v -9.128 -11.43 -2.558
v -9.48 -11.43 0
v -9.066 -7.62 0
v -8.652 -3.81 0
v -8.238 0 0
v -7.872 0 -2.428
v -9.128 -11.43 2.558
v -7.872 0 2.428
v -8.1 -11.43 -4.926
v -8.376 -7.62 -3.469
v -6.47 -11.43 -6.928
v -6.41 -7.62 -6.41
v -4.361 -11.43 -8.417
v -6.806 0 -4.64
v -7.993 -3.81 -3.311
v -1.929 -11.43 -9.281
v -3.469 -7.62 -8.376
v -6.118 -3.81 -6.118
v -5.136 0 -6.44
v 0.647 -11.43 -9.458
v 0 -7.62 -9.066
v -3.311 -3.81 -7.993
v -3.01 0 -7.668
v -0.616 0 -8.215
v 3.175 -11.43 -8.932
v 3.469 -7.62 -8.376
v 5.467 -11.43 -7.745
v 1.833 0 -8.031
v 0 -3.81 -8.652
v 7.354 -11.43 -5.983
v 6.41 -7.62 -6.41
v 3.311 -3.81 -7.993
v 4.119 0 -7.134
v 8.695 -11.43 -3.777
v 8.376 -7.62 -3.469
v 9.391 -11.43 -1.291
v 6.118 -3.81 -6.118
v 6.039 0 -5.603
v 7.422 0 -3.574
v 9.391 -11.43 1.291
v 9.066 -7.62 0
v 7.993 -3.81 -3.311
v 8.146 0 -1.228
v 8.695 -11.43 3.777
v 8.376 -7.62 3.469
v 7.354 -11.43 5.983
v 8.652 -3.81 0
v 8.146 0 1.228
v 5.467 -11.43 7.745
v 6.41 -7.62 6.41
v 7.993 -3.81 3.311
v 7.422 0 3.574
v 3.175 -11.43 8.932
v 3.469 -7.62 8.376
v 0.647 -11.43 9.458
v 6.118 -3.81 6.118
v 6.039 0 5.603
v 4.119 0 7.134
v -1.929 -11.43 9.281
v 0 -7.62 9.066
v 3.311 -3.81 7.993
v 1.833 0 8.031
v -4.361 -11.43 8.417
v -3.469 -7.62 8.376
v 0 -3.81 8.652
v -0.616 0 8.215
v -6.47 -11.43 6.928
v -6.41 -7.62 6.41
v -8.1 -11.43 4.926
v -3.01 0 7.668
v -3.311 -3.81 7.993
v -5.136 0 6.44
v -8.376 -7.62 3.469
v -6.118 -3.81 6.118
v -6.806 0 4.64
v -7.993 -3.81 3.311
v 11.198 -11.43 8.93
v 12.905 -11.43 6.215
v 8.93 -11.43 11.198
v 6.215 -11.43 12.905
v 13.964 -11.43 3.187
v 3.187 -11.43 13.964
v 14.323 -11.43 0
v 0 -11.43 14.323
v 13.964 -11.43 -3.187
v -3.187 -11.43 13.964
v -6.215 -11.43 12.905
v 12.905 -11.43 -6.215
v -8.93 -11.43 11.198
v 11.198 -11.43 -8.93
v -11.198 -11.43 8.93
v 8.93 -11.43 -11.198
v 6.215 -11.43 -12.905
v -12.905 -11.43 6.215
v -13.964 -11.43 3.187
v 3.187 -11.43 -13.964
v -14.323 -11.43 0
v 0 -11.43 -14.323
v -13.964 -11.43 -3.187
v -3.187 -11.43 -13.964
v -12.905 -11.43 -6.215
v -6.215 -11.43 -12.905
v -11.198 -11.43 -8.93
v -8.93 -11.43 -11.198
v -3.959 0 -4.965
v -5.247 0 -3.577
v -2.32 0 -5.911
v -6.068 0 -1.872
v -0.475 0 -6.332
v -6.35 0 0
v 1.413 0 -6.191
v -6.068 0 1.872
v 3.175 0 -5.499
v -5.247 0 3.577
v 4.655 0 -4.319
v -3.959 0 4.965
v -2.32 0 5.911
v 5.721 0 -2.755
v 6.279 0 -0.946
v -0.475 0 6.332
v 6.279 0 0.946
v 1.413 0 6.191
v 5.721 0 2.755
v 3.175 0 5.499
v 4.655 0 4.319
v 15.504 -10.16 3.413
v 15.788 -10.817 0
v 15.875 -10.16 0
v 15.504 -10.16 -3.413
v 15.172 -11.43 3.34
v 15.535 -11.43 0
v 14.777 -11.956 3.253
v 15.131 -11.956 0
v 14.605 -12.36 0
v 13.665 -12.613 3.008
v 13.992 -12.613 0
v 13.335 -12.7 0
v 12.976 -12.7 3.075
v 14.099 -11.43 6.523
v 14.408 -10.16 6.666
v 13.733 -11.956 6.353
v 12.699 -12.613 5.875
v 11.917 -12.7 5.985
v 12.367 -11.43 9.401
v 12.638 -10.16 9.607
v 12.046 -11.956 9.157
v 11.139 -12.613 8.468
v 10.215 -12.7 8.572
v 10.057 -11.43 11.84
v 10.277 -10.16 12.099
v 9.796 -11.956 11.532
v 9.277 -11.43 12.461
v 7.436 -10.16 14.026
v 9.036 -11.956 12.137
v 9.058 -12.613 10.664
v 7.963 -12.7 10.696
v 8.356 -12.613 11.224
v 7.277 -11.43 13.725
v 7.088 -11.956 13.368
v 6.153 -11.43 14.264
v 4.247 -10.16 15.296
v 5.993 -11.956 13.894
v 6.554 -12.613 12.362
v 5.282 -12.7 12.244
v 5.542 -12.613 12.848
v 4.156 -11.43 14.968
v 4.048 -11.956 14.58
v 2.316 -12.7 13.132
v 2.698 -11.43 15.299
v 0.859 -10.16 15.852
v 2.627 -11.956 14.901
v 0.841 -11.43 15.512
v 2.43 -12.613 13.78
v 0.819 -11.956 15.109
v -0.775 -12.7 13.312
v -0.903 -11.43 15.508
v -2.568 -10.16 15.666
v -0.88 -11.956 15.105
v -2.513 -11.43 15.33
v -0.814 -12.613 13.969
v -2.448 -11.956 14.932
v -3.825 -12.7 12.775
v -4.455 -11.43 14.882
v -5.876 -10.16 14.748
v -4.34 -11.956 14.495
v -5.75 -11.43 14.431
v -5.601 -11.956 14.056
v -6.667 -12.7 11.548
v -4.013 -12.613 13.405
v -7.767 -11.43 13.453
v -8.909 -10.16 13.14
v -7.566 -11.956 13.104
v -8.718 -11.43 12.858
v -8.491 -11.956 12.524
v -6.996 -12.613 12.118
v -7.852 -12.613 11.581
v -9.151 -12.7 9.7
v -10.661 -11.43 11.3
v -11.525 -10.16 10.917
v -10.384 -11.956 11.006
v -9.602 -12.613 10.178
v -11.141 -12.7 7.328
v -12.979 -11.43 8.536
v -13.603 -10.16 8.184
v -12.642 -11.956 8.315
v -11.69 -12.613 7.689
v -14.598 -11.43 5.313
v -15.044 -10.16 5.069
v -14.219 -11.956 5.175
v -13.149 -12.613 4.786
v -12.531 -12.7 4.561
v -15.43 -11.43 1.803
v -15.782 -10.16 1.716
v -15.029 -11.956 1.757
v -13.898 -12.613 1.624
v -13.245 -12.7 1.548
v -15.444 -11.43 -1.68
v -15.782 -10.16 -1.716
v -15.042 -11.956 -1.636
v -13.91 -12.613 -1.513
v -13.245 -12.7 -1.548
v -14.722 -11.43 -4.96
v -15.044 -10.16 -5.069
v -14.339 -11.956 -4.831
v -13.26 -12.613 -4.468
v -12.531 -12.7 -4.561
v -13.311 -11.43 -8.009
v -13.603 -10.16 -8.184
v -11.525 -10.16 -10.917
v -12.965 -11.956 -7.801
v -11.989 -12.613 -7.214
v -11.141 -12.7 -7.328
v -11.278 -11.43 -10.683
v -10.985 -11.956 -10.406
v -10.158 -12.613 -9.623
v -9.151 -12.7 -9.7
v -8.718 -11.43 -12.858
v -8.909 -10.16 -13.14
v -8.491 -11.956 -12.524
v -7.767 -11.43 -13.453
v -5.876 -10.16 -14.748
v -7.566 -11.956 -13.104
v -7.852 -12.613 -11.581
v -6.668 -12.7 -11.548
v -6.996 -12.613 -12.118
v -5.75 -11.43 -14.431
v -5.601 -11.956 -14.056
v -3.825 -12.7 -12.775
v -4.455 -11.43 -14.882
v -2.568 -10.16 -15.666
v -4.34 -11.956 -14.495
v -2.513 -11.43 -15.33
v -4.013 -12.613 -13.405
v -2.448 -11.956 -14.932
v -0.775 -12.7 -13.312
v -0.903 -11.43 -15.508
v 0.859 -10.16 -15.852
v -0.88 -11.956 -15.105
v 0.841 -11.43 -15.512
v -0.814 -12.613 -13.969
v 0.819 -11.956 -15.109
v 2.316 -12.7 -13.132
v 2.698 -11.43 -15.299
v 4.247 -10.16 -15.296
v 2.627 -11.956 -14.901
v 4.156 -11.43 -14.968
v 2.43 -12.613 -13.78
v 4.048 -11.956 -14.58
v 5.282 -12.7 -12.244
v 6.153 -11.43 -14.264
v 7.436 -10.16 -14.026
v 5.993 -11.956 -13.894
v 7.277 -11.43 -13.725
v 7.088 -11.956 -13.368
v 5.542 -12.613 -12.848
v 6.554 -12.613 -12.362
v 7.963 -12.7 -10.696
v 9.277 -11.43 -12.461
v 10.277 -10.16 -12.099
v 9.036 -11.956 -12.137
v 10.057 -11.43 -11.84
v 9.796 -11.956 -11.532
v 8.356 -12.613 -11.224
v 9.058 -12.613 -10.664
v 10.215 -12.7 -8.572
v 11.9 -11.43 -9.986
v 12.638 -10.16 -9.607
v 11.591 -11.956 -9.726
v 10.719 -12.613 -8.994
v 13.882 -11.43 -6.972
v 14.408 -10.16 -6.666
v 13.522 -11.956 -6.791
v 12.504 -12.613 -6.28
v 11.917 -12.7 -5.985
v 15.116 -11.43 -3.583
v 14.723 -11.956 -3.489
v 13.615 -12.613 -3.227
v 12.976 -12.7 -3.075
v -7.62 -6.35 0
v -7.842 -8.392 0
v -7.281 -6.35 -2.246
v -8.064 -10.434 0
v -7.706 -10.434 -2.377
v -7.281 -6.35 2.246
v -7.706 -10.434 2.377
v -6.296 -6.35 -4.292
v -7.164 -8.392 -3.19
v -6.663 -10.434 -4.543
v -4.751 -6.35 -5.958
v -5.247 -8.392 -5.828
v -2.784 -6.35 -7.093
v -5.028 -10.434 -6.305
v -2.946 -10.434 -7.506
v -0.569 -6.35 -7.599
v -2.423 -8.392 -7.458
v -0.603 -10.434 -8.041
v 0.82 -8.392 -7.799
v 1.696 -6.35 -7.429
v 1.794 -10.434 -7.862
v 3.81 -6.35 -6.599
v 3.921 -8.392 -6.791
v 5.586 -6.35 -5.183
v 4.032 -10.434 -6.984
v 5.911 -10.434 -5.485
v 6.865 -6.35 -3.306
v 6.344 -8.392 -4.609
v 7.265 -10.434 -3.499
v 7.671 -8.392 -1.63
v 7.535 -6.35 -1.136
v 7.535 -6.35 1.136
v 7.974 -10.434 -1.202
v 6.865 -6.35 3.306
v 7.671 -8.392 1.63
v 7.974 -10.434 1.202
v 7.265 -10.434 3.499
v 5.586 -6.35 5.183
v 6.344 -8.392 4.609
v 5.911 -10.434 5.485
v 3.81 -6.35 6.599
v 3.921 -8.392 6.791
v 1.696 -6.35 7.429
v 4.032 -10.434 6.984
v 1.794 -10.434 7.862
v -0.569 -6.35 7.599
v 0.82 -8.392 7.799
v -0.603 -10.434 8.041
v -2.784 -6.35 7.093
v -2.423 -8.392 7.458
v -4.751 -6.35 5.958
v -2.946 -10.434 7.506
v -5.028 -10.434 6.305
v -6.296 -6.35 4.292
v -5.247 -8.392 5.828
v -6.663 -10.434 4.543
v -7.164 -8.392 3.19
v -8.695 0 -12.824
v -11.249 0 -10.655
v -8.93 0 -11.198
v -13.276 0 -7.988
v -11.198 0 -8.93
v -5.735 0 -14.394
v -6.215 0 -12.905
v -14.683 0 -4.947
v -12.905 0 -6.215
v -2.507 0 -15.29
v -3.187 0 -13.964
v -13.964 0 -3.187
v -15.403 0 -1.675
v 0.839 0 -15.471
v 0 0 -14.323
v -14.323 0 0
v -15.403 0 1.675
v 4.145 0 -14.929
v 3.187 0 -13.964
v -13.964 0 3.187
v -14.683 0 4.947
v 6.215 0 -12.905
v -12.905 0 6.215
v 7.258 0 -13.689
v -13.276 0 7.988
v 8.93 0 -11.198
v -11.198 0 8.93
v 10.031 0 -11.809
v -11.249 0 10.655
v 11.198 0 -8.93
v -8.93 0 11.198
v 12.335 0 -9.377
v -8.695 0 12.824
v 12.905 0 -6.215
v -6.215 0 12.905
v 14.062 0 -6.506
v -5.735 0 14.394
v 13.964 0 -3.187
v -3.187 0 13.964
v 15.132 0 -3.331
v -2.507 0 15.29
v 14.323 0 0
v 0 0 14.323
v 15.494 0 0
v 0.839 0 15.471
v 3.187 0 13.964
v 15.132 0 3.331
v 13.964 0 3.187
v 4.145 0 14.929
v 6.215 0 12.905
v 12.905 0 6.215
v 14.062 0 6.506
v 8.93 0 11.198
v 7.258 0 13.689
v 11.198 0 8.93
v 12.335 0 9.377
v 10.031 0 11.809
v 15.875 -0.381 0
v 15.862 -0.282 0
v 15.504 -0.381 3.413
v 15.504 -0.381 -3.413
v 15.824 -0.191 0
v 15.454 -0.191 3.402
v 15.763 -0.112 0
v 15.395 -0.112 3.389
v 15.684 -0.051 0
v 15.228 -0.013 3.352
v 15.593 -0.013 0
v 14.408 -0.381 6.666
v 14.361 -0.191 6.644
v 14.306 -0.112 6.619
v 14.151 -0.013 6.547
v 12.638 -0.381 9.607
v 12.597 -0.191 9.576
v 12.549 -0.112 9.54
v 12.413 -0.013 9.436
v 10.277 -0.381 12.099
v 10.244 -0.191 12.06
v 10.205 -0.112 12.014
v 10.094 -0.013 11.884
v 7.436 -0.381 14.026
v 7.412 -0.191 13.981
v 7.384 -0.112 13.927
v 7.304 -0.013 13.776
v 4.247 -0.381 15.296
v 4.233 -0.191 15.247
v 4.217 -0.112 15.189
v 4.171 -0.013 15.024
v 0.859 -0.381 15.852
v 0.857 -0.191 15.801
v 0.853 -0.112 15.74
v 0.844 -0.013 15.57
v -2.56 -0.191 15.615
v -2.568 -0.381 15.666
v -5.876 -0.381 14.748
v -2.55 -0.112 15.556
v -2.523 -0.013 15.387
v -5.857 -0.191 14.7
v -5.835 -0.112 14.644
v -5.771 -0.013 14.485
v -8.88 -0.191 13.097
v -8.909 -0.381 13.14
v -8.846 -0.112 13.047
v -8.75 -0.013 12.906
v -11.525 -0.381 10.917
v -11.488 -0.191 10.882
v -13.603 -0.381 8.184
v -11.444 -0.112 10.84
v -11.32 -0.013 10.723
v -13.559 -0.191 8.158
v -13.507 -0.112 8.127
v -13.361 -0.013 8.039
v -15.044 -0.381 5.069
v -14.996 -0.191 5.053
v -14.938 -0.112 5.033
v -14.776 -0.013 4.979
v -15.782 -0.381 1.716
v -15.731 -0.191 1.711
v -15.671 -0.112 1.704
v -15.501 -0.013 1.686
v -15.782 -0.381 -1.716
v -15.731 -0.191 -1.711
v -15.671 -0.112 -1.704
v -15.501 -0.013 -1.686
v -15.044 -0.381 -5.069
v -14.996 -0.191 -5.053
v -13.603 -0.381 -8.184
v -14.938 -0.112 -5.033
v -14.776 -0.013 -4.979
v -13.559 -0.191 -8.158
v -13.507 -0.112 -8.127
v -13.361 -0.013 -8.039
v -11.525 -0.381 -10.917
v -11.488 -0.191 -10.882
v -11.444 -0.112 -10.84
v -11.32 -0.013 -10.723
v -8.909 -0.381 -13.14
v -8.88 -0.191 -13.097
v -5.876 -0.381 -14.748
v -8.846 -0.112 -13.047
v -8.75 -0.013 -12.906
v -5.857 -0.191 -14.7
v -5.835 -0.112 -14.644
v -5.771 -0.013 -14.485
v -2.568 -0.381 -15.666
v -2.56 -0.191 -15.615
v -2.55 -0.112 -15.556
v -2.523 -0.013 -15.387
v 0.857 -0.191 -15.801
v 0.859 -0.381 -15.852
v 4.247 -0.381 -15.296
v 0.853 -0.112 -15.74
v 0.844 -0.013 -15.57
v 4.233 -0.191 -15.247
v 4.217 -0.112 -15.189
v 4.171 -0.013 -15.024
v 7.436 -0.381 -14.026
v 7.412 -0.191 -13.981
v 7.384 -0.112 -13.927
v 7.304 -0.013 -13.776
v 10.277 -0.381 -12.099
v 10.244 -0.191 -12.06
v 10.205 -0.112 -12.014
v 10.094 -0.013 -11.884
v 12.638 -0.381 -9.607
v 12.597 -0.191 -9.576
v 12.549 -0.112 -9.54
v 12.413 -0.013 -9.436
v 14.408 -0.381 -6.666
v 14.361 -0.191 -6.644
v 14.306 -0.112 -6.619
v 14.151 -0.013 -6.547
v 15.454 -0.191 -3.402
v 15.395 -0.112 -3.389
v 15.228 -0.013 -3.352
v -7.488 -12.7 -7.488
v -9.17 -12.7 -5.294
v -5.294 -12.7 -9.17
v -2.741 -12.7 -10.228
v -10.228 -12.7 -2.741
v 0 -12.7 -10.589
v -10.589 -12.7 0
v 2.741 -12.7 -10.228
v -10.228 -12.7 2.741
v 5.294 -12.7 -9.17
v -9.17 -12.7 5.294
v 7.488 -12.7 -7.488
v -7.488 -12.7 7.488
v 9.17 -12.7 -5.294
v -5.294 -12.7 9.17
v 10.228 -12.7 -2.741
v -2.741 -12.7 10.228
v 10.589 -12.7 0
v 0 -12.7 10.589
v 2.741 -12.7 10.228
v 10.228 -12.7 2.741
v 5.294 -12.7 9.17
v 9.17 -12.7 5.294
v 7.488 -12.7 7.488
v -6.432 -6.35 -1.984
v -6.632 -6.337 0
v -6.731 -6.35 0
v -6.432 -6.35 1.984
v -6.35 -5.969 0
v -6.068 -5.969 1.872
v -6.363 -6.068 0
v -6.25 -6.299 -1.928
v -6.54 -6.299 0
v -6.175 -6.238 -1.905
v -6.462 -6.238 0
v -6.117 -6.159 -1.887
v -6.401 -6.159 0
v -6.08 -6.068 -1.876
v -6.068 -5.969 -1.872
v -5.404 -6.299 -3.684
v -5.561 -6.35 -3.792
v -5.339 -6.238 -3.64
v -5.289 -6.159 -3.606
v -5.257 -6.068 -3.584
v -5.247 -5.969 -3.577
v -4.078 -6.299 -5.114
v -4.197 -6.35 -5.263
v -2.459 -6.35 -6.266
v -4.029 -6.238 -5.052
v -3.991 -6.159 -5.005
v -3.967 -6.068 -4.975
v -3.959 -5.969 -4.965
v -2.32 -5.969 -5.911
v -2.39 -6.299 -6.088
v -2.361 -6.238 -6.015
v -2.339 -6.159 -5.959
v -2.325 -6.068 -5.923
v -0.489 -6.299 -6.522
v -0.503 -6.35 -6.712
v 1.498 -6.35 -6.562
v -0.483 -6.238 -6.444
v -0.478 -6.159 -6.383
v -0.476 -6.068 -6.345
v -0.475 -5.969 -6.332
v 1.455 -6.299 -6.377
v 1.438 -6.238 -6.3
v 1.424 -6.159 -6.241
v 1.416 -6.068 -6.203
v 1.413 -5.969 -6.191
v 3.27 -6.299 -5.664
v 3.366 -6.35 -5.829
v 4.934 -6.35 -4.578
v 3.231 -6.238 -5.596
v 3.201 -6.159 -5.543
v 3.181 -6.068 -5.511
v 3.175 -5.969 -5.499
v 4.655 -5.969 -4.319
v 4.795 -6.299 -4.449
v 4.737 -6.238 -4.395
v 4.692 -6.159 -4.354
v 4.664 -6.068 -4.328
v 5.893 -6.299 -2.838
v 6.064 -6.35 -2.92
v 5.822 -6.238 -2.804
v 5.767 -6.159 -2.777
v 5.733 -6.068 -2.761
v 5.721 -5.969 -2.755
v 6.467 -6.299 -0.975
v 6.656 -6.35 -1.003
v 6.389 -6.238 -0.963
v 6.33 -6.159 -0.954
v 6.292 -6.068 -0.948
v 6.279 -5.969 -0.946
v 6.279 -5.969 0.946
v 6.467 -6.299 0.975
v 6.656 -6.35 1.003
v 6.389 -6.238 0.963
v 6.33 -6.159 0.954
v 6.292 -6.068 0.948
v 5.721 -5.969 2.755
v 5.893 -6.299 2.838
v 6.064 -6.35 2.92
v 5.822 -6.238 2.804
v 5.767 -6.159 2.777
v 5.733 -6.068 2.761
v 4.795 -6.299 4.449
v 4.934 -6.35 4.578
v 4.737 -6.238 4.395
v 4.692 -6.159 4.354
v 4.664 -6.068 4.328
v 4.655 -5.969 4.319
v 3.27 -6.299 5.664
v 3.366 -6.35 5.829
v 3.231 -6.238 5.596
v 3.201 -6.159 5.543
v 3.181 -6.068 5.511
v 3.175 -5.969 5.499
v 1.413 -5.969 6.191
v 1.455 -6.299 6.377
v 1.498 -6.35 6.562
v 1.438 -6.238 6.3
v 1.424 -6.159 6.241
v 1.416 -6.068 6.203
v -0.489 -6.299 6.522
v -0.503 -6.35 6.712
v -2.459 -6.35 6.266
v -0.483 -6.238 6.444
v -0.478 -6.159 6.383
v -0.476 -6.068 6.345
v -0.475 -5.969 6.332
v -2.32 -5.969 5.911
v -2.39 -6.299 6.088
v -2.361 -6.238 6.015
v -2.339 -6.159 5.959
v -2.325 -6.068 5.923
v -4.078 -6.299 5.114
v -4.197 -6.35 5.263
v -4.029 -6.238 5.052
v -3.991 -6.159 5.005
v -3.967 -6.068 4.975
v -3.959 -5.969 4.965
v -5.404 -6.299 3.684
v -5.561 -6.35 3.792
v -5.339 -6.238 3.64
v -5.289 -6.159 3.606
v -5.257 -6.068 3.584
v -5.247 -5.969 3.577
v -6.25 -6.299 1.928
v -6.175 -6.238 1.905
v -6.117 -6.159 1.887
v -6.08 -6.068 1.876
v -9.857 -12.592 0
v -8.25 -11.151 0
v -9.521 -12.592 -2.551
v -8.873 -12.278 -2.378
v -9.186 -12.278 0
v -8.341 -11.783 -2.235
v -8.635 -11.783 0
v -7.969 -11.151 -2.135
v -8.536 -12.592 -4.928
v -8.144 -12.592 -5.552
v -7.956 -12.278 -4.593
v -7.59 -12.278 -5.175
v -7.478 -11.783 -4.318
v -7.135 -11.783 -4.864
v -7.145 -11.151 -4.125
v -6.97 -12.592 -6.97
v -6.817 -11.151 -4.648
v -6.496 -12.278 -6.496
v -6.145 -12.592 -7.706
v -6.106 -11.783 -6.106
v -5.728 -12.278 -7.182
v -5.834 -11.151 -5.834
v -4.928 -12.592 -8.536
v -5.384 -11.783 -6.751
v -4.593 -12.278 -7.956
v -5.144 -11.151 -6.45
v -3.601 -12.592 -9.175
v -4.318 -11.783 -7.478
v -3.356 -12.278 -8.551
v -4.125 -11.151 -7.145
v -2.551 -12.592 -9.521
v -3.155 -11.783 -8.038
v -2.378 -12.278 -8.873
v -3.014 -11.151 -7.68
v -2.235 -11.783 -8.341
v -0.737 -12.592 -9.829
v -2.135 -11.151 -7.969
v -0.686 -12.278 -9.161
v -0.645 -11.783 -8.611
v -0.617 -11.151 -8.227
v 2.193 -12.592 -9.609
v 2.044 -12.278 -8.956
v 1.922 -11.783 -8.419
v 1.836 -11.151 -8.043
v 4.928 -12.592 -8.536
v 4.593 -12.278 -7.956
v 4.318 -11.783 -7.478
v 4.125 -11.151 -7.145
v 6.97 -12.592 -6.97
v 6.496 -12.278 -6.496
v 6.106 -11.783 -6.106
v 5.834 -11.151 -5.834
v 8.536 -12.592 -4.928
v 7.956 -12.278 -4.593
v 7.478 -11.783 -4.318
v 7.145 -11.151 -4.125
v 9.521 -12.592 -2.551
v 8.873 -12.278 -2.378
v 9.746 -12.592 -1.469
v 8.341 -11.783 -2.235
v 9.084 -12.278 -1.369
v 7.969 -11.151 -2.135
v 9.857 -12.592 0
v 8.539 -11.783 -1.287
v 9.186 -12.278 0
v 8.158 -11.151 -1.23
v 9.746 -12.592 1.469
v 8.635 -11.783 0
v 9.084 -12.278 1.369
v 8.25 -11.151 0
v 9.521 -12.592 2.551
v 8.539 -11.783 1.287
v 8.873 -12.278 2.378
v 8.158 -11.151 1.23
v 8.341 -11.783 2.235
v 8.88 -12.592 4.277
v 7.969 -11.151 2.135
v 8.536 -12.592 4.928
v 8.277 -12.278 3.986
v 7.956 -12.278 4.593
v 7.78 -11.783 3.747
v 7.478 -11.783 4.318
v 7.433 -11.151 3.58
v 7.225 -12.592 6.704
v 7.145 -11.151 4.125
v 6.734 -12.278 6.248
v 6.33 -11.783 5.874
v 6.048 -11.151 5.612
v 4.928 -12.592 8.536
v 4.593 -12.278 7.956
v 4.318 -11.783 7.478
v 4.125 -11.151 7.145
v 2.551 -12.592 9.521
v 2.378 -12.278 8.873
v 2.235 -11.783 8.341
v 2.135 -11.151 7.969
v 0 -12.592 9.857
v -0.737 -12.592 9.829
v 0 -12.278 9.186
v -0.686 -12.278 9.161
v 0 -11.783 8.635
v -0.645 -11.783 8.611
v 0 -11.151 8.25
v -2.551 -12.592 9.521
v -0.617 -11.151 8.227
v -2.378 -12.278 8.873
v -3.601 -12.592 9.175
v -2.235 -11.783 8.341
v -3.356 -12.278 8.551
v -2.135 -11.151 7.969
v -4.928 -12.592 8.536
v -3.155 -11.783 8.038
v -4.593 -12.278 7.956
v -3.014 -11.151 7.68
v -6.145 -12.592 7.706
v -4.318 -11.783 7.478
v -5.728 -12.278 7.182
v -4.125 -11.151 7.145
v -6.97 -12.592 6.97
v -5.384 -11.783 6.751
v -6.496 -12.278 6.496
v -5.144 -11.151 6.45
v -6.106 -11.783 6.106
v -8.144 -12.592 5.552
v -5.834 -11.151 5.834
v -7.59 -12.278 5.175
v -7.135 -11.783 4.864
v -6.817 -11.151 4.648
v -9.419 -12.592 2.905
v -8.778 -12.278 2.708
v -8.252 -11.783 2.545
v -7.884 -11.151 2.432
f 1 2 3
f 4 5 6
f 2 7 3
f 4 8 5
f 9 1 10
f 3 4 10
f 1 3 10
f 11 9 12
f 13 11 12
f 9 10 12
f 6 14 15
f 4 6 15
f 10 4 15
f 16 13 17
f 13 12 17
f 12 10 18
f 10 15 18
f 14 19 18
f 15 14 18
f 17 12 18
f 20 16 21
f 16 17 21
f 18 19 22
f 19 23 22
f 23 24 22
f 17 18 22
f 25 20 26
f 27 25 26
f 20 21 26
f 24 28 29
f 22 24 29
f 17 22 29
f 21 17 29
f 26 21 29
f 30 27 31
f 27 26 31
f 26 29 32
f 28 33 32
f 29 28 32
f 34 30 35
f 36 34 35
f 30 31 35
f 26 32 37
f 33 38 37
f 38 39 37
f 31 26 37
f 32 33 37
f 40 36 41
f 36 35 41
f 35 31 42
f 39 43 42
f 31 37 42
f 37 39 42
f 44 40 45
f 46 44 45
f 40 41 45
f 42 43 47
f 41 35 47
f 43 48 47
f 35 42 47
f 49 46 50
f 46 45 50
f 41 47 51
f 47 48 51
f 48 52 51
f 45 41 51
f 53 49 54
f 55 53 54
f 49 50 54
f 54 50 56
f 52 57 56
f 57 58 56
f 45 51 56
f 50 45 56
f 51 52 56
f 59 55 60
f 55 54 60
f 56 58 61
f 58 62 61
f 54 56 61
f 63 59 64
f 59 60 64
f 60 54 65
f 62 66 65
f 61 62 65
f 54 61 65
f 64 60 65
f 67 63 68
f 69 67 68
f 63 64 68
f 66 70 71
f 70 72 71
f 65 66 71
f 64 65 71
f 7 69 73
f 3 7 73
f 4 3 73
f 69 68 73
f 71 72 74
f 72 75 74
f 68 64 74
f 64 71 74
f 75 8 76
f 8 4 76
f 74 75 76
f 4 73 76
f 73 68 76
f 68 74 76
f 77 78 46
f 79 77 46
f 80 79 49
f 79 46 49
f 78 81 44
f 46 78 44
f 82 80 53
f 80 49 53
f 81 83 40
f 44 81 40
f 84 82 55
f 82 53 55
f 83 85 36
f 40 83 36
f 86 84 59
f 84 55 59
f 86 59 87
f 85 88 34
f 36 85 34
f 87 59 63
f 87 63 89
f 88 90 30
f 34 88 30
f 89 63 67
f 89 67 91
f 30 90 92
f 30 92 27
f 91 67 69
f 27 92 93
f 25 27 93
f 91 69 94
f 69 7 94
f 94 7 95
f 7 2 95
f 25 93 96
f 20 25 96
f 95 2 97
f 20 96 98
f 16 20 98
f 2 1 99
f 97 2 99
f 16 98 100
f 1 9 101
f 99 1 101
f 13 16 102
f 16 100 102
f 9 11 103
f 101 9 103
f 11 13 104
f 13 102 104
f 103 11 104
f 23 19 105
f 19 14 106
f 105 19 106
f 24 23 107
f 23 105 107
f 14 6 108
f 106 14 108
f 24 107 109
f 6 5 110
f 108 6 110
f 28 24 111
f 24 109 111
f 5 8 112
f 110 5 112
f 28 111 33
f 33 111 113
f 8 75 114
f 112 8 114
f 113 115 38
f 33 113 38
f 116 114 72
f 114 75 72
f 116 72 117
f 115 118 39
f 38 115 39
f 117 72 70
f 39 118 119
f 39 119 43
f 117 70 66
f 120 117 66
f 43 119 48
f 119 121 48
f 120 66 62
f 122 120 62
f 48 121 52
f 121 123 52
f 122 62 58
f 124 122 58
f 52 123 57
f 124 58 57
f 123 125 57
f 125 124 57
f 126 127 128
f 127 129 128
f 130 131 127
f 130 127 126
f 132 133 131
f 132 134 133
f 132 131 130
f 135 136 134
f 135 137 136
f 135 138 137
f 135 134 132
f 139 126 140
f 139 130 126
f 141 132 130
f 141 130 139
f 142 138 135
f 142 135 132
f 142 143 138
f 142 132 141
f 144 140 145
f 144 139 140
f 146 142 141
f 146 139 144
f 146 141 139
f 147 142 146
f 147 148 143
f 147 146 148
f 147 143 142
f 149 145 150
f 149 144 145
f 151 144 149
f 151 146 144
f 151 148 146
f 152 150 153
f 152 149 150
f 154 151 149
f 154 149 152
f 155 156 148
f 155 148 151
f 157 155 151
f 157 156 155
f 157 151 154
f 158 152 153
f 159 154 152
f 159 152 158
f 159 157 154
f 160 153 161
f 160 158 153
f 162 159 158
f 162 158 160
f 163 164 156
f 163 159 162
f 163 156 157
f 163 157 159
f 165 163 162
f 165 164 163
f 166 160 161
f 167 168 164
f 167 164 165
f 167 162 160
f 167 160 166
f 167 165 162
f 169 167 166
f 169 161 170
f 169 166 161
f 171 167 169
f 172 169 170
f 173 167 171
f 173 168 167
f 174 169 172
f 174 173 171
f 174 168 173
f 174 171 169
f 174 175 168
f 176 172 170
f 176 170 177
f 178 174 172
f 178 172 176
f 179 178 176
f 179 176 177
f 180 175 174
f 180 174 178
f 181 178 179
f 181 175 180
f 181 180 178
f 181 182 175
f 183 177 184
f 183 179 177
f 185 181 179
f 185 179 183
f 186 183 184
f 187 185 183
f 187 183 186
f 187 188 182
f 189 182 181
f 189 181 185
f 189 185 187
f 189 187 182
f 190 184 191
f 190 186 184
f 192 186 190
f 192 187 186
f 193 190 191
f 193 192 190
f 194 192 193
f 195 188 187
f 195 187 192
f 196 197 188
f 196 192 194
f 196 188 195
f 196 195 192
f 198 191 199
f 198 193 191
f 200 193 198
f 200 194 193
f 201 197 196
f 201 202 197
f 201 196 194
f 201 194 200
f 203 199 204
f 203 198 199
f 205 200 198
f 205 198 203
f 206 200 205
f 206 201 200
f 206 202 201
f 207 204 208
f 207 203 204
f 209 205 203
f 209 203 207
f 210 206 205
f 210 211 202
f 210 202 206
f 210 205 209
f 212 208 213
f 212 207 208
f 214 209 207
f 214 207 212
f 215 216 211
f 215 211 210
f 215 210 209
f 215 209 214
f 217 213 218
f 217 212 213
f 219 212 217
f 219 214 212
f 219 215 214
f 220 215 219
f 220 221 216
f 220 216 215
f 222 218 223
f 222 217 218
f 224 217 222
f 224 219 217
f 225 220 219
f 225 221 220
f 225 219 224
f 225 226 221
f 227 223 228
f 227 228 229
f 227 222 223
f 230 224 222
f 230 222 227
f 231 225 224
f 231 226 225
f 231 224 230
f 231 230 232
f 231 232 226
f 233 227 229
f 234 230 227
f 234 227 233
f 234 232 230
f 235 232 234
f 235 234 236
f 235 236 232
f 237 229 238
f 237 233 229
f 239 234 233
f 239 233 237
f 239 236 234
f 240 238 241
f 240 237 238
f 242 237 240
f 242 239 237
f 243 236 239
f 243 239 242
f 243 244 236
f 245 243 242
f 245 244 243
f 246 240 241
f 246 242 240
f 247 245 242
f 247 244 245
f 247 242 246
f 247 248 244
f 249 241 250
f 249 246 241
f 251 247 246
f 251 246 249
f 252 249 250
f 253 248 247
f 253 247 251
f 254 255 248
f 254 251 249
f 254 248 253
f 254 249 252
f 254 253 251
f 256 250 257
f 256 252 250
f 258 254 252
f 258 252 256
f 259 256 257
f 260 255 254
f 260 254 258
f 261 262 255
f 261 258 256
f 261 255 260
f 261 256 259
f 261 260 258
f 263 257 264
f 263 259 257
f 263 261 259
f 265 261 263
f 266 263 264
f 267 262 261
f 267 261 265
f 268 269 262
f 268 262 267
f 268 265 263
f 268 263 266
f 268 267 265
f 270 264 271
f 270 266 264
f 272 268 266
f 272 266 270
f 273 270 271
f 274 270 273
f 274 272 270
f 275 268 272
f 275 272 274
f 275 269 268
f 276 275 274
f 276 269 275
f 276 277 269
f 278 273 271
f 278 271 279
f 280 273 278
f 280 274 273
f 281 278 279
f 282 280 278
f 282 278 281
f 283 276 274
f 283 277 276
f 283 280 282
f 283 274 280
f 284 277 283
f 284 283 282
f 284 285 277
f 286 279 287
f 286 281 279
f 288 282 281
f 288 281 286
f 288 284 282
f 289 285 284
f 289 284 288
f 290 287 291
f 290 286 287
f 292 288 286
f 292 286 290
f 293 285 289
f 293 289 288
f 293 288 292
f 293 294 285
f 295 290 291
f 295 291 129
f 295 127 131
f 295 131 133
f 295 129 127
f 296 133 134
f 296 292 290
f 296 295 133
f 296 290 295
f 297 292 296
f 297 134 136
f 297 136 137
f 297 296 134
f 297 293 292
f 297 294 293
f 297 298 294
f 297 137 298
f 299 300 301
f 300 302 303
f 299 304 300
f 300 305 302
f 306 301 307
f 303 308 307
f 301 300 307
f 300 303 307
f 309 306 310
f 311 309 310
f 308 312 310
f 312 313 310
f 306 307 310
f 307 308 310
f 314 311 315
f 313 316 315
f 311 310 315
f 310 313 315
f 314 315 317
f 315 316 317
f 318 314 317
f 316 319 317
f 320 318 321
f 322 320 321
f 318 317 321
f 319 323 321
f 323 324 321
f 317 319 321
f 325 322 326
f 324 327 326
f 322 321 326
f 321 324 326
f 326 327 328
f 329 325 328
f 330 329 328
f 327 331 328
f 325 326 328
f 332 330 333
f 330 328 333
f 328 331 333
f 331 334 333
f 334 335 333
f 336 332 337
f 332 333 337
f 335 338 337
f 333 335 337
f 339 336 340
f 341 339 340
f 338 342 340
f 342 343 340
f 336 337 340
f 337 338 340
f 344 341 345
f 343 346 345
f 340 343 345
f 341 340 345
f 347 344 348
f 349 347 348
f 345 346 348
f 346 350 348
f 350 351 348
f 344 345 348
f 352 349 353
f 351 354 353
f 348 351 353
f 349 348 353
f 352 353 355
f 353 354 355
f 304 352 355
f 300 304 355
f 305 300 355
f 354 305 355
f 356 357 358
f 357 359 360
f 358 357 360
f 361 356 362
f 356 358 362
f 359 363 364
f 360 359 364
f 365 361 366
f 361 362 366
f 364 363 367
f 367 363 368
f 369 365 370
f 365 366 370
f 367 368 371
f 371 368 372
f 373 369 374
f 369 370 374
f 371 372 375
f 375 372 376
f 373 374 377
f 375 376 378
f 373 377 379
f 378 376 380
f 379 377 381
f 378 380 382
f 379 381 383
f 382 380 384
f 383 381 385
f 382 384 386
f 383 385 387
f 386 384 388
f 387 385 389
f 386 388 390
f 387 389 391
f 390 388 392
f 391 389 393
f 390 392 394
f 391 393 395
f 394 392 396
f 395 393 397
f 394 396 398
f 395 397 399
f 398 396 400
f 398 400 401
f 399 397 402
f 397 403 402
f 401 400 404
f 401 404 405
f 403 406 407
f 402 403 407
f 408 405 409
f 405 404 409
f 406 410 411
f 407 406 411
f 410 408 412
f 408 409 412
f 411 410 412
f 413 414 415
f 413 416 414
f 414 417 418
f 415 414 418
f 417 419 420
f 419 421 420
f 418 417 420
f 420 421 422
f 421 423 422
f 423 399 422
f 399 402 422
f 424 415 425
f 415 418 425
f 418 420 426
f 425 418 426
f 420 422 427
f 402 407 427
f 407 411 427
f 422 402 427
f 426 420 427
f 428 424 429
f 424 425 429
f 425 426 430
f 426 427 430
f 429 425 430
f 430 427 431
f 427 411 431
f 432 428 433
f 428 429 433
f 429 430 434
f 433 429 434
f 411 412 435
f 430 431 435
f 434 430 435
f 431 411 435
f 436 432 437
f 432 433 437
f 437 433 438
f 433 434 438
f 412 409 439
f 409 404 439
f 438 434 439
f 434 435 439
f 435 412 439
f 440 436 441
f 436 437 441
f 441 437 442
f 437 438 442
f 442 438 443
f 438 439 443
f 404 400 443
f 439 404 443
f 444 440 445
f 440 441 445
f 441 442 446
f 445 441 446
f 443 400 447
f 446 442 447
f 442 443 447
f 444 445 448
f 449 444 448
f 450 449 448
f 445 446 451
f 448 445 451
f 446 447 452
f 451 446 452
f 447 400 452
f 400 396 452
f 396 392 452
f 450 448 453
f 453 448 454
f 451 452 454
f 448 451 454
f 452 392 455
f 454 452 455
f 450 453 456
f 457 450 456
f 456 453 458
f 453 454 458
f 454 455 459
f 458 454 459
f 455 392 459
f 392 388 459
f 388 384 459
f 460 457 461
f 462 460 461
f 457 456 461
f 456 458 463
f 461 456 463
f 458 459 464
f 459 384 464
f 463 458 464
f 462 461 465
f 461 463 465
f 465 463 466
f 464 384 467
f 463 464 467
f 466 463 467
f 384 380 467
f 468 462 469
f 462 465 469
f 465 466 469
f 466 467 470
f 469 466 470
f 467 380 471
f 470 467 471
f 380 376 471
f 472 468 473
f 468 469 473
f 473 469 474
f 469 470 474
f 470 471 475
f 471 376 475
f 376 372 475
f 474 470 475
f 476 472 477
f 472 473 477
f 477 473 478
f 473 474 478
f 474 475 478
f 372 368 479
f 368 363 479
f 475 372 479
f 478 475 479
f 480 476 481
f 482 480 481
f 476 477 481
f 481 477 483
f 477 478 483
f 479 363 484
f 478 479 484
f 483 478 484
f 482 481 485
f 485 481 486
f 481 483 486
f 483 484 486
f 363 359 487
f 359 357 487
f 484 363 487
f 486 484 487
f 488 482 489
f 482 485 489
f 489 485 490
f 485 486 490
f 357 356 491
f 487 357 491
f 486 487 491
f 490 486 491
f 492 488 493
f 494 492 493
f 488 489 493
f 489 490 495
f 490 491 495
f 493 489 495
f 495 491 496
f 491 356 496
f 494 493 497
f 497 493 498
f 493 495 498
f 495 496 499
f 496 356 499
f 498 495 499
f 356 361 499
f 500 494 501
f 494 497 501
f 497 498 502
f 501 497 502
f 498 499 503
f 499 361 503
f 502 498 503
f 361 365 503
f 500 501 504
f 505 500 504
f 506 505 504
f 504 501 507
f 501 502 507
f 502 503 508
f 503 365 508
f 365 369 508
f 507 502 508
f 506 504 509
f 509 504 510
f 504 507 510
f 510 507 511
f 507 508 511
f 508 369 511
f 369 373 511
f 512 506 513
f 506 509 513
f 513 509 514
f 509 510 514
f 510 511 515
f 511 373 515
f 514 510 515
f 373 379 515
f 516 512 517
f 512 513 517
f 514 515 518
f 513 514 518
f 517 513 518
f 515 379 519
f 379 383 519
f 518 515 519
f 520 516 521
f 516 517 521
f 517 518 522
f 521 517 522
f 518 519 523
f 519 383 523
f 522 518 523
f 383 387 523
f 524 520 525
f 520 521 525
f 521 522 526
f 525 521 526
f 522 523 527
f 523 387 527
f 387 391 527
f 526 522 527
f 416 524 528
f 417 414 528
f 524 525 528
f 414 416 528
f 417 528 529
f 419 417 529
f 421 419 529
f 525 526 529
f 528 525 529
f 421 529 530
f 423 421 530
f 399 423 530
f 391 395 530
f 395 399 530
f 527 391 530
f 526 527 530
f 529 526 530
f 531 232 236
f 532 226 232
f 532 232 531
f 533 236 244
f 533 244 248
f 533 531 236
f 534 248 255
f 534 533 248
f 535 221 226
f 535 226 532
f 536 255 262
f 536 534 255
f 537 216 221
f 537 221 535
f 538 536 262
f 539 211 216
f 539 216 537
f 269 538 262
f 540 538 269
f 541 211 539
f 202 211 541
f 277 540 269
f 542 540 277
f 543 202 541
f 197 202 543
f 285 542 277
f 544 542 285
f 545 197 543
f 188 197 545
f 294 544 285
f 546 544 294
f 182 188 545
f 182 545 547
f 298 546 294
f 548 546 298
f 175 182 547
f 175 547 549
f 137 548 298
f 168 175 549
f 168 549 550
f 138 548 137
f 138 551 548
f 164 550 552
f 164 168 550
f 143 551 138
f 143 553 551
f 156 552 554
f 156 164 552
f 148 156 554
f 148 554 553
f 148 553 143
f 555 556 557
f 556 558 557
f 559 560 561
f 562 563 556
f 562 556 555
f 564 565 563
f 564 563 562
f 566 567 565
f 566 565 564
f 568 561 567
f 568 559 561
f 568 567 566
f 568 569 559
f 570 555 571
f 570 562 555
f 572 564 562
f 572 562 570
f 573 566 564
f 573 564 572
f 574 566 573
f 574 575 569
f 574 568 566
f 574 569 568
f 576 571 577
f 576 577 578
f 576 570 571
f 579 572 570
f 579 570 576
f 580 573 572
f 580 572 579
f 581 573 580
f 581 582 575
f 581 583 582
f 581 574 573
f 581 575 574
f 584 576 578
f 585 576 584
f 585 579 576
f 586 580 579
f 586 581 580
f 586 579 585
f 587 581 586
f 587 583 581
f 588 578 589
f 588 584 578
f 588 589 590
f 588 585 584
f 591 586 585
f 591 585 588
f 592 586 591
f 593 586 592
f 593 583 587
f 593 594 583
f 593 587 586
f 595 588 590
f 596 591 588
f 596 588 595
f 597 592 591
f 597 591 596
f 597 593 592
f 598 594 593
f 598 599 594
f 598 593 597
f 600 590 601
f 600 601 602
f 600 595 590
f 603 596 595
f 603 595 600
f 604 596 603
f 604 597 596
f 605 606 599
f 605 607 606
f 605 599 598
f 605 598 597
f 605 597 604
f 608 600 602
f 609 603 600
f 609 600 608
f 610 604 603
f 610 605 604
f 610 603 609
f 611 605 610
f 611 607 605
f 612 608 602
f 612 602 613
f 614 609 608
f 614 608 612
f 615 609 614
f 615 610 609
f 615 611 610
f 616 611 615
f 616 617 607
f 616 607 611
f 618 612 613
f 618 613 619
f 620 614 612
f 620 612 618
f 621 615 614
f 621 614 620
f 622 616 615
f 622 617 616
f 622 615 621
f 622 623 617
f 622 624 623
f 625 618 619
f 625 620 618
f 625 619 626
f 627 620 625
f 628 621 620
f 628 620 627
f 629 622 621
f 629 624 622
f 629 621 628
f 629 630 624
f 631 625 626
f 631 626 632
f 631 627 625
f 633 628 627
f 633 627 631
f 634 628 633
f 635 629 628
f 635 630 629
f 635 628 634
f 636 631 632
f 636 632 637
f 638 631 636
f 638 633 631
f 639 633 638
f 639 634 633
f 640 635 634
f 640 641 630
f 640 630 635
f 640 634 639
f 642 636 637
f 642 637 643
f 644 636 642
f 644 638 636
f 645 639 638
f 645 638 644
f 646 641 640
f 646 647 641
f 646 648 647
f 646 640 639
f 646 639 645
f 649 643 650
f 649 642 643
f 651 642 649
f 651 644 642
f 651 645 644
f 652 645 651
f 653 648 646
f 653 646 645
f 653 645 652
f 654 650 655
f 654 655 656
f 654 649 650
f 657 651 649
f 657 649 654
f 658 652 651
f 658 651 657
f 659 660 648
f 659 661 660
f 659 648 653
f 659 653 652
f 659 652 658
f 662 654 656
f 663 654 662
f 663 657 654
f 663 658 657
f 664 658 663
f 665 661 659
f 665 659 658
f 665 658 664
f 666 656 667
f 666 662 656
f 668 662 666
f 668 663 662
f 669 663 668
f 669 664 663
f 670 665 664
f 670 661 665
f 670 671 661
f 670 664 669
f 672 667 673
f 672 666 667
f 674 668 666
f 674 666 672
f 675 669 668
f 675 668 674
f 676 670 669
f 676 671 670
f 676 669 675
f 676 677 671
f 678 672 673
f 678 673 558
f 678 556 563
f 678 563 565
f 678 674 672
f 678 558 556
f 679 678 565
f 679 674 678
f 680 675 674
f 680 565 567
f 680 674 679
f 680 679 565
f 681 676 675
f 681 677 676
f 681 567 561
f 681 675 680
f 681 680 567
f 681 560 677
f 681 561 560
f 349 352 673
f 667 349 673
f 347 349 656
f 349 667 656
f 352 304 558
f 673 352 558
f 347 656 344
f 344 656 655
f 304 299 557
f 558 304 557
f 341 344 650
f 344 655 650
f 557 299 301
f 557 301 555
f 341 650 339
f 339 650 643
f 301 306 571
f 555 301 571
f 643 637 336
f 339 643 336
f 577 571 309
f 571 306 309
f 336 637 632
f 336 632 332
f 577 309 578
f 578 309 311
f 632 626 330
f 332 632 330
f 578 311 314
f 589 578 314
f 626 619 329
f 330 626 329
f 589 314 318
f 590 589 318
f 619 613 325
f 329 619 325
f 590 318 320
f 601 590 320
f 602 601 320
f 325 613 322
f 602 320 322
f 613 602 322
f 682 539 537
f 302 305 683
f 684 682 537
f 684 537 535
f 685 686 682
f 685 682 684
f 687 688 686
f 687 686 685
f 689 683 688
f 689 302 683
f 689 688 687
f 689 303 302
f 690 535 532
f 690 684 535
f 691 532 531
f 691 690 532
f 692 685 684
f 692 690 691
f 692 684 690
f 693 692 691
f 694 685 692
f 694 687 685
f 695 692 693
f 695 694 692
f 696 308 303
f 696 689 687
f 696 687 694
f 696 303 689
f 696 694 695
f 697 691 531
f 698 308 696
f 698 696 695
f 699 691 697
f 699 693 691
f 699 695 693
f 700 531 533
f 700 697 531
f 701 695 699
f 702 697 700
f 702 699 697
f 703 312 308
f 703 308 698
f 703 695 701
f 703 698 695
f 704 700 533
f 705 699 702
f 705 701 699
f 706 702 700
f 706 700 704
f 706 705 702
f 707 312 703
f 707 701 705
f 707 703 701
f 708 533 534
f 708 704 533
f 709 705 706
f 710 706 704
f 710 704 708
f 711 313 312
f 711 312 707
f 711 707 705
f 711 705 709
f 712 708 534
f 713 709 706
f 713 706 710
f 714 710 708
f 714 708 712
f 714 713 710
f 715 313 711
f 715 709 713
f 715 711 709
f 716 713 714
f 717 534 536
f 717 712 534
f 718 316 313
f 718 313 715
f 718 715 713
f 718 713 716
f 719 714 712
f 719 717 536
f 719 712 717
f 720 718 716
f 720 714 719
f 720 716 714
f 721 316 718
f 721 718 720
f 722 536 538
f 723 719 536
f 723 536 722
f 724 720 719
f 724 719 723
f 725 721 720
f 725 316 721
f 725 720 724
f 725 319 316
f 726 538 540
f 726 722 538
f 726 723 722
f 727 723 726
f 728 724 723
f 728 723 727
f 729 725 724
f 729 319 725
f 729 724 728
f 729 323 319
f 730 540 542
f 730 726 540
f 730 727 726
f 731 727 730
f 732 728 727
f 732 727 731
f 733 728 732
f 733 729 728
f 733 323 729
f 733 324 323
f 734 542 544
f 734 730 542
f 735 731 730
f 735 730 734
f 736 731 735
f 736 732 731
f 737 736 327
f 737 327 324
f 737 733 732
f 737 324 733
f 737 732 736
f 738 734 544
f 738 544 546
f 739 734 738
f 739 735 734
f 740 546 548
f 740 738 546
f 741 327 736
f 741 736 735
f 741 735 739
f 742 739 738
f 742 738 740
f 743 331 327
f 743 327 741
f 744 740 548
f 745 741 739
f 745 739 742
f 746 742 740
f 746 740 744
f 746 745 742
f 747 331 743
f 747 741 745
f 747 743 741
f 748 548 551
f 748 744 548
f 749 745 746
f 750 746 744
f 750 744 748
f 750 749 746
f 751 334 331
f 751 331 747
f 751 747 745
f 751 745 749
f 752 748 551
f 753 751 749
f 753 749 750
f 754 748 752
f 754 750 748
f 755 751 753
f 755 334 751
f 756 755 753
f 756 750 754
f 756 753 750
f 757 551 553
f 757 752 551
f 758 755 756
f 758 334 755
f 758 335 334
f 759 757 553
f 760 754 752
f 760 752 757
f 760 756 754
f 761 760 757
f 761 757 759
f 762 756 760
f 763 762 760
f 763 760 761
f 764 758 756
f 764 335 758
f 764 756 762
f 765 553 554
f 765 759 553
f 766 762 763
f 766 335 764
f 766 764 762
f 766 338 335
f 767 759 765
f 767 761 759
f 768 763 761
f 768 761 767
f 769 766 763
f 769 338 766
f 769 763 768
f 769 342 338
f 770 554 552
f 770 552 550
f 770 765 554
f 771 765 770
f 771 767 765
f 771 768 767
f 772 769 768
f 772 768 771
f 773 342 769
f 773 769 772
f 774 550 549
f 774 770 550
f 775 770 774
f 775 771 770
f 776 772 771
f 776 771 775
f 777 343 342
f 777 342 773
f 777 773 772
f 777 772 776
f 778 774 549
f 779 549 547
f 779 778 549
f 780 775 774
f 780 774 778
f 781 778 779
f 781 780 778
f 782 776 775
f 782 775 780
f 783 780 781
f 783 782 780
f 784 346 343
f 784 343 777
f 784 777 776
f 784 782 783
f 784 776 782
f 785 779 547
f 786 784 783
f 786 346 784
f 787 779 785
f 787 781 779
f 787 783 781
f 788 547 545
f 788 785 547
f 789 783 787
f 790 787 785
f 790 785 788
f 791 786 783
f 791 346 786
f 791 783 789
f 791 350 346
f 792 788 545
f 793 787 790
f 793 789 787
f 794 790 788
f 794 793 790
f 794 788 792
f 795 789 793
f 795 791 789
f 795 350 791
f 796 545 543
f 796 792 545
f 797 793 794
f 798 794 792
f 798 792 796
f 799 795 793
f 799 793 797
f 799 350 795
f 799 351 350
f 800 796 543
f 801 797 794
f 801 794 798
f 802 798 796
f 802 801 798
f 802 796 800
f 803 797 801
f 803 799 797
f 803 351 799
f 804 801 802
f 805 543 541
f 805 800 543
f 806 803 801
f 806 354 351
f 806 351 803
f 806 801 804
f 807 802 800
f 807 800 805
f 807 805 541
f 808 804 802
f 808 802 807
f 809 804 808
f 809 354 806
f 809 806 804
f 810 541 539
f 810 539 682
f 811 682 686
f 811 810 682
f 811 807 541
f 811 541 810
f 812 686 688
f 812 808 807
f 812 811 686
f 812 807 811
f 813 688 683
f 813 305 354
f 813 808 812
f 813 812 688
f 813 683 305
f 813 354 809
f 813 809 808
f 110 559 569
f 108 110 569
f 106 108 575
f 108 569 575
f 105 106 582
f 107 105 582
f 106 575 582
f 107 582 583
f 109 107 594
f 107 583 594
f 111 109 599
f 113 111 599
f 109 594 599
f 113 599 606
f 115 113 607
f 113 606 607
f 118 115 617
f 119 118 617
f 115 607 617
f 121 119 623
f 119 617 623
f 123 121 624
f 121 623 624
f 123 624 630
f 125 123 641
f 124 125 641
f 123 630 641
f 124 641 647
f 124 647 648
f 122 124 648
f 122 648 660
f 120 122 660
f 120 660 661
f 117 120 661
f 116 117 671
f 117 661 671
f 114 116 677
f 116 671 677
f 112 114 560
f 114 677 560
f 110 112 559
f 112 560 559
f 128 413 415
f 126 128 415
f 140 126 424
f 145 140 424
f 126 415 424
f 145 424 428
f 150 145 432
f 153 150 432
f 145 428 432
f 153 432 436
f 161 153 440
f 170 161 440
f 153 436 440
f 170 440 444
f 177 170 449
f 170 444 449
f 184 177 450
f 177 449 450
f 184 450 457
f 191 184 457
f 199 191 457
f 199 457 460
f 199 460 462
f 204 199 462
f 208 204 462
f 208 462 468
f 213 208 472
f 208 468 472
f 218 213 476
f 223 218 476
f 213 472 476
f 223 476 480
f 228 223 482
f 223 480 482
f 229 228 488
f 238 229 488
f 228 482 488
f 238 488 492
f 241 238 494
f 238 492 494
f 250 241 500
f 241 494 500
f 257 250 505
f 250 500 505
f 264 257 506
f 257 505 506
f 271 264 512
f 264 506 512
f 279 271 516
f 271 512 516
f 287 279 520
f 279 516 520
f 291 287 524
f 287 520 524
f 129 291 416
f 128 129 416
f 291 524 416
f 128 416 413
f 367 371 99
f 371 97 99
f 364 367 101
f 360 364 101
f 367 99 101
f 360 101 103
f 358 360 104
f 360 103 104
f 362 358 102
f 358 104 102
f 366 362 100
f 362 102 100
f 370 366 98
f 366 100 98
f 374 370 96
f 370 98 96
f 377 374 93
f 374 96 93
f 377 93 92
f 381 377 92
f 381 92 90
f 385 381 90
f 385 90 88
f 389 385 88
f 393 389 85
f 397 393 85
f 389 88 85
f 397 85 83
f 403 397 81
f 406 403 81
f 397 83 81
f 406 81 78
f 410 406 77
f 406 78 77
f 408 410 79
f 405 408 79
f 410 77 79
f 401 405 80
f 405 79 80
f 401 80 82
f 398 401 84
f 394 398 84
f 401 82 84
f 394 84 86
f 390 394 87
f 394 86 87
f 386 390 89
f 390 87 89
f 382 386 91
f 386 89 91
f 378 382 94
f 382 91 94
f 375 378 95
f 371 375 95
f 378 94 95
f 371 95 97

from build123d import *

# Parameters (mm, degrees)
F0_R     = 15.875
F1_DEPTH = 12.7
F4_R     = 2.54
F5_R     = 0.381


with BuildPart() as f1:
    # F0 (on Front) → F1 (new body)
    with BuildSketch(Plane.XZ):
        Circle(F0_R)
    extrude(amount=F1_DEPTH)

    # F2 (on Top) → F3 (revolve, cut)
    with BuildSketch(Plane.XY):
        Polygon((0, -12.7), (0, 0), (-6.35, 0), (-6.35, -6.35), (-7.62, -6.35), (-8.3100605367, -12.7), align=None)
        Polygon((-9.4797436824, -11.43), (-8.2376347163, 0), (-14.3230315298, 0), (-14.3230315298, -11.43), align=None)
    revolve(axis=Axis((0, -6.35, 0), (0, -1, 0)), mode=Mode.SUBTRACT)

    # F4
    f4_edges = [f1.edges().sort_by_distance(p)[0] for p in [
        (-15.875, -12.7, 0),
        (8.310061, -12.7, 0),
    ]]
    fillet(f4_edges, radius=F4_R)

    # F5
    f5_edges = [f1.edges().sort_by_distance(p)[0] for p in [
        (-15.875, 0, 0),
        (6.35, -6.35, 0),
    ]]
    fillet(f5_edges, radius=F5_R)


solid = f1.part
